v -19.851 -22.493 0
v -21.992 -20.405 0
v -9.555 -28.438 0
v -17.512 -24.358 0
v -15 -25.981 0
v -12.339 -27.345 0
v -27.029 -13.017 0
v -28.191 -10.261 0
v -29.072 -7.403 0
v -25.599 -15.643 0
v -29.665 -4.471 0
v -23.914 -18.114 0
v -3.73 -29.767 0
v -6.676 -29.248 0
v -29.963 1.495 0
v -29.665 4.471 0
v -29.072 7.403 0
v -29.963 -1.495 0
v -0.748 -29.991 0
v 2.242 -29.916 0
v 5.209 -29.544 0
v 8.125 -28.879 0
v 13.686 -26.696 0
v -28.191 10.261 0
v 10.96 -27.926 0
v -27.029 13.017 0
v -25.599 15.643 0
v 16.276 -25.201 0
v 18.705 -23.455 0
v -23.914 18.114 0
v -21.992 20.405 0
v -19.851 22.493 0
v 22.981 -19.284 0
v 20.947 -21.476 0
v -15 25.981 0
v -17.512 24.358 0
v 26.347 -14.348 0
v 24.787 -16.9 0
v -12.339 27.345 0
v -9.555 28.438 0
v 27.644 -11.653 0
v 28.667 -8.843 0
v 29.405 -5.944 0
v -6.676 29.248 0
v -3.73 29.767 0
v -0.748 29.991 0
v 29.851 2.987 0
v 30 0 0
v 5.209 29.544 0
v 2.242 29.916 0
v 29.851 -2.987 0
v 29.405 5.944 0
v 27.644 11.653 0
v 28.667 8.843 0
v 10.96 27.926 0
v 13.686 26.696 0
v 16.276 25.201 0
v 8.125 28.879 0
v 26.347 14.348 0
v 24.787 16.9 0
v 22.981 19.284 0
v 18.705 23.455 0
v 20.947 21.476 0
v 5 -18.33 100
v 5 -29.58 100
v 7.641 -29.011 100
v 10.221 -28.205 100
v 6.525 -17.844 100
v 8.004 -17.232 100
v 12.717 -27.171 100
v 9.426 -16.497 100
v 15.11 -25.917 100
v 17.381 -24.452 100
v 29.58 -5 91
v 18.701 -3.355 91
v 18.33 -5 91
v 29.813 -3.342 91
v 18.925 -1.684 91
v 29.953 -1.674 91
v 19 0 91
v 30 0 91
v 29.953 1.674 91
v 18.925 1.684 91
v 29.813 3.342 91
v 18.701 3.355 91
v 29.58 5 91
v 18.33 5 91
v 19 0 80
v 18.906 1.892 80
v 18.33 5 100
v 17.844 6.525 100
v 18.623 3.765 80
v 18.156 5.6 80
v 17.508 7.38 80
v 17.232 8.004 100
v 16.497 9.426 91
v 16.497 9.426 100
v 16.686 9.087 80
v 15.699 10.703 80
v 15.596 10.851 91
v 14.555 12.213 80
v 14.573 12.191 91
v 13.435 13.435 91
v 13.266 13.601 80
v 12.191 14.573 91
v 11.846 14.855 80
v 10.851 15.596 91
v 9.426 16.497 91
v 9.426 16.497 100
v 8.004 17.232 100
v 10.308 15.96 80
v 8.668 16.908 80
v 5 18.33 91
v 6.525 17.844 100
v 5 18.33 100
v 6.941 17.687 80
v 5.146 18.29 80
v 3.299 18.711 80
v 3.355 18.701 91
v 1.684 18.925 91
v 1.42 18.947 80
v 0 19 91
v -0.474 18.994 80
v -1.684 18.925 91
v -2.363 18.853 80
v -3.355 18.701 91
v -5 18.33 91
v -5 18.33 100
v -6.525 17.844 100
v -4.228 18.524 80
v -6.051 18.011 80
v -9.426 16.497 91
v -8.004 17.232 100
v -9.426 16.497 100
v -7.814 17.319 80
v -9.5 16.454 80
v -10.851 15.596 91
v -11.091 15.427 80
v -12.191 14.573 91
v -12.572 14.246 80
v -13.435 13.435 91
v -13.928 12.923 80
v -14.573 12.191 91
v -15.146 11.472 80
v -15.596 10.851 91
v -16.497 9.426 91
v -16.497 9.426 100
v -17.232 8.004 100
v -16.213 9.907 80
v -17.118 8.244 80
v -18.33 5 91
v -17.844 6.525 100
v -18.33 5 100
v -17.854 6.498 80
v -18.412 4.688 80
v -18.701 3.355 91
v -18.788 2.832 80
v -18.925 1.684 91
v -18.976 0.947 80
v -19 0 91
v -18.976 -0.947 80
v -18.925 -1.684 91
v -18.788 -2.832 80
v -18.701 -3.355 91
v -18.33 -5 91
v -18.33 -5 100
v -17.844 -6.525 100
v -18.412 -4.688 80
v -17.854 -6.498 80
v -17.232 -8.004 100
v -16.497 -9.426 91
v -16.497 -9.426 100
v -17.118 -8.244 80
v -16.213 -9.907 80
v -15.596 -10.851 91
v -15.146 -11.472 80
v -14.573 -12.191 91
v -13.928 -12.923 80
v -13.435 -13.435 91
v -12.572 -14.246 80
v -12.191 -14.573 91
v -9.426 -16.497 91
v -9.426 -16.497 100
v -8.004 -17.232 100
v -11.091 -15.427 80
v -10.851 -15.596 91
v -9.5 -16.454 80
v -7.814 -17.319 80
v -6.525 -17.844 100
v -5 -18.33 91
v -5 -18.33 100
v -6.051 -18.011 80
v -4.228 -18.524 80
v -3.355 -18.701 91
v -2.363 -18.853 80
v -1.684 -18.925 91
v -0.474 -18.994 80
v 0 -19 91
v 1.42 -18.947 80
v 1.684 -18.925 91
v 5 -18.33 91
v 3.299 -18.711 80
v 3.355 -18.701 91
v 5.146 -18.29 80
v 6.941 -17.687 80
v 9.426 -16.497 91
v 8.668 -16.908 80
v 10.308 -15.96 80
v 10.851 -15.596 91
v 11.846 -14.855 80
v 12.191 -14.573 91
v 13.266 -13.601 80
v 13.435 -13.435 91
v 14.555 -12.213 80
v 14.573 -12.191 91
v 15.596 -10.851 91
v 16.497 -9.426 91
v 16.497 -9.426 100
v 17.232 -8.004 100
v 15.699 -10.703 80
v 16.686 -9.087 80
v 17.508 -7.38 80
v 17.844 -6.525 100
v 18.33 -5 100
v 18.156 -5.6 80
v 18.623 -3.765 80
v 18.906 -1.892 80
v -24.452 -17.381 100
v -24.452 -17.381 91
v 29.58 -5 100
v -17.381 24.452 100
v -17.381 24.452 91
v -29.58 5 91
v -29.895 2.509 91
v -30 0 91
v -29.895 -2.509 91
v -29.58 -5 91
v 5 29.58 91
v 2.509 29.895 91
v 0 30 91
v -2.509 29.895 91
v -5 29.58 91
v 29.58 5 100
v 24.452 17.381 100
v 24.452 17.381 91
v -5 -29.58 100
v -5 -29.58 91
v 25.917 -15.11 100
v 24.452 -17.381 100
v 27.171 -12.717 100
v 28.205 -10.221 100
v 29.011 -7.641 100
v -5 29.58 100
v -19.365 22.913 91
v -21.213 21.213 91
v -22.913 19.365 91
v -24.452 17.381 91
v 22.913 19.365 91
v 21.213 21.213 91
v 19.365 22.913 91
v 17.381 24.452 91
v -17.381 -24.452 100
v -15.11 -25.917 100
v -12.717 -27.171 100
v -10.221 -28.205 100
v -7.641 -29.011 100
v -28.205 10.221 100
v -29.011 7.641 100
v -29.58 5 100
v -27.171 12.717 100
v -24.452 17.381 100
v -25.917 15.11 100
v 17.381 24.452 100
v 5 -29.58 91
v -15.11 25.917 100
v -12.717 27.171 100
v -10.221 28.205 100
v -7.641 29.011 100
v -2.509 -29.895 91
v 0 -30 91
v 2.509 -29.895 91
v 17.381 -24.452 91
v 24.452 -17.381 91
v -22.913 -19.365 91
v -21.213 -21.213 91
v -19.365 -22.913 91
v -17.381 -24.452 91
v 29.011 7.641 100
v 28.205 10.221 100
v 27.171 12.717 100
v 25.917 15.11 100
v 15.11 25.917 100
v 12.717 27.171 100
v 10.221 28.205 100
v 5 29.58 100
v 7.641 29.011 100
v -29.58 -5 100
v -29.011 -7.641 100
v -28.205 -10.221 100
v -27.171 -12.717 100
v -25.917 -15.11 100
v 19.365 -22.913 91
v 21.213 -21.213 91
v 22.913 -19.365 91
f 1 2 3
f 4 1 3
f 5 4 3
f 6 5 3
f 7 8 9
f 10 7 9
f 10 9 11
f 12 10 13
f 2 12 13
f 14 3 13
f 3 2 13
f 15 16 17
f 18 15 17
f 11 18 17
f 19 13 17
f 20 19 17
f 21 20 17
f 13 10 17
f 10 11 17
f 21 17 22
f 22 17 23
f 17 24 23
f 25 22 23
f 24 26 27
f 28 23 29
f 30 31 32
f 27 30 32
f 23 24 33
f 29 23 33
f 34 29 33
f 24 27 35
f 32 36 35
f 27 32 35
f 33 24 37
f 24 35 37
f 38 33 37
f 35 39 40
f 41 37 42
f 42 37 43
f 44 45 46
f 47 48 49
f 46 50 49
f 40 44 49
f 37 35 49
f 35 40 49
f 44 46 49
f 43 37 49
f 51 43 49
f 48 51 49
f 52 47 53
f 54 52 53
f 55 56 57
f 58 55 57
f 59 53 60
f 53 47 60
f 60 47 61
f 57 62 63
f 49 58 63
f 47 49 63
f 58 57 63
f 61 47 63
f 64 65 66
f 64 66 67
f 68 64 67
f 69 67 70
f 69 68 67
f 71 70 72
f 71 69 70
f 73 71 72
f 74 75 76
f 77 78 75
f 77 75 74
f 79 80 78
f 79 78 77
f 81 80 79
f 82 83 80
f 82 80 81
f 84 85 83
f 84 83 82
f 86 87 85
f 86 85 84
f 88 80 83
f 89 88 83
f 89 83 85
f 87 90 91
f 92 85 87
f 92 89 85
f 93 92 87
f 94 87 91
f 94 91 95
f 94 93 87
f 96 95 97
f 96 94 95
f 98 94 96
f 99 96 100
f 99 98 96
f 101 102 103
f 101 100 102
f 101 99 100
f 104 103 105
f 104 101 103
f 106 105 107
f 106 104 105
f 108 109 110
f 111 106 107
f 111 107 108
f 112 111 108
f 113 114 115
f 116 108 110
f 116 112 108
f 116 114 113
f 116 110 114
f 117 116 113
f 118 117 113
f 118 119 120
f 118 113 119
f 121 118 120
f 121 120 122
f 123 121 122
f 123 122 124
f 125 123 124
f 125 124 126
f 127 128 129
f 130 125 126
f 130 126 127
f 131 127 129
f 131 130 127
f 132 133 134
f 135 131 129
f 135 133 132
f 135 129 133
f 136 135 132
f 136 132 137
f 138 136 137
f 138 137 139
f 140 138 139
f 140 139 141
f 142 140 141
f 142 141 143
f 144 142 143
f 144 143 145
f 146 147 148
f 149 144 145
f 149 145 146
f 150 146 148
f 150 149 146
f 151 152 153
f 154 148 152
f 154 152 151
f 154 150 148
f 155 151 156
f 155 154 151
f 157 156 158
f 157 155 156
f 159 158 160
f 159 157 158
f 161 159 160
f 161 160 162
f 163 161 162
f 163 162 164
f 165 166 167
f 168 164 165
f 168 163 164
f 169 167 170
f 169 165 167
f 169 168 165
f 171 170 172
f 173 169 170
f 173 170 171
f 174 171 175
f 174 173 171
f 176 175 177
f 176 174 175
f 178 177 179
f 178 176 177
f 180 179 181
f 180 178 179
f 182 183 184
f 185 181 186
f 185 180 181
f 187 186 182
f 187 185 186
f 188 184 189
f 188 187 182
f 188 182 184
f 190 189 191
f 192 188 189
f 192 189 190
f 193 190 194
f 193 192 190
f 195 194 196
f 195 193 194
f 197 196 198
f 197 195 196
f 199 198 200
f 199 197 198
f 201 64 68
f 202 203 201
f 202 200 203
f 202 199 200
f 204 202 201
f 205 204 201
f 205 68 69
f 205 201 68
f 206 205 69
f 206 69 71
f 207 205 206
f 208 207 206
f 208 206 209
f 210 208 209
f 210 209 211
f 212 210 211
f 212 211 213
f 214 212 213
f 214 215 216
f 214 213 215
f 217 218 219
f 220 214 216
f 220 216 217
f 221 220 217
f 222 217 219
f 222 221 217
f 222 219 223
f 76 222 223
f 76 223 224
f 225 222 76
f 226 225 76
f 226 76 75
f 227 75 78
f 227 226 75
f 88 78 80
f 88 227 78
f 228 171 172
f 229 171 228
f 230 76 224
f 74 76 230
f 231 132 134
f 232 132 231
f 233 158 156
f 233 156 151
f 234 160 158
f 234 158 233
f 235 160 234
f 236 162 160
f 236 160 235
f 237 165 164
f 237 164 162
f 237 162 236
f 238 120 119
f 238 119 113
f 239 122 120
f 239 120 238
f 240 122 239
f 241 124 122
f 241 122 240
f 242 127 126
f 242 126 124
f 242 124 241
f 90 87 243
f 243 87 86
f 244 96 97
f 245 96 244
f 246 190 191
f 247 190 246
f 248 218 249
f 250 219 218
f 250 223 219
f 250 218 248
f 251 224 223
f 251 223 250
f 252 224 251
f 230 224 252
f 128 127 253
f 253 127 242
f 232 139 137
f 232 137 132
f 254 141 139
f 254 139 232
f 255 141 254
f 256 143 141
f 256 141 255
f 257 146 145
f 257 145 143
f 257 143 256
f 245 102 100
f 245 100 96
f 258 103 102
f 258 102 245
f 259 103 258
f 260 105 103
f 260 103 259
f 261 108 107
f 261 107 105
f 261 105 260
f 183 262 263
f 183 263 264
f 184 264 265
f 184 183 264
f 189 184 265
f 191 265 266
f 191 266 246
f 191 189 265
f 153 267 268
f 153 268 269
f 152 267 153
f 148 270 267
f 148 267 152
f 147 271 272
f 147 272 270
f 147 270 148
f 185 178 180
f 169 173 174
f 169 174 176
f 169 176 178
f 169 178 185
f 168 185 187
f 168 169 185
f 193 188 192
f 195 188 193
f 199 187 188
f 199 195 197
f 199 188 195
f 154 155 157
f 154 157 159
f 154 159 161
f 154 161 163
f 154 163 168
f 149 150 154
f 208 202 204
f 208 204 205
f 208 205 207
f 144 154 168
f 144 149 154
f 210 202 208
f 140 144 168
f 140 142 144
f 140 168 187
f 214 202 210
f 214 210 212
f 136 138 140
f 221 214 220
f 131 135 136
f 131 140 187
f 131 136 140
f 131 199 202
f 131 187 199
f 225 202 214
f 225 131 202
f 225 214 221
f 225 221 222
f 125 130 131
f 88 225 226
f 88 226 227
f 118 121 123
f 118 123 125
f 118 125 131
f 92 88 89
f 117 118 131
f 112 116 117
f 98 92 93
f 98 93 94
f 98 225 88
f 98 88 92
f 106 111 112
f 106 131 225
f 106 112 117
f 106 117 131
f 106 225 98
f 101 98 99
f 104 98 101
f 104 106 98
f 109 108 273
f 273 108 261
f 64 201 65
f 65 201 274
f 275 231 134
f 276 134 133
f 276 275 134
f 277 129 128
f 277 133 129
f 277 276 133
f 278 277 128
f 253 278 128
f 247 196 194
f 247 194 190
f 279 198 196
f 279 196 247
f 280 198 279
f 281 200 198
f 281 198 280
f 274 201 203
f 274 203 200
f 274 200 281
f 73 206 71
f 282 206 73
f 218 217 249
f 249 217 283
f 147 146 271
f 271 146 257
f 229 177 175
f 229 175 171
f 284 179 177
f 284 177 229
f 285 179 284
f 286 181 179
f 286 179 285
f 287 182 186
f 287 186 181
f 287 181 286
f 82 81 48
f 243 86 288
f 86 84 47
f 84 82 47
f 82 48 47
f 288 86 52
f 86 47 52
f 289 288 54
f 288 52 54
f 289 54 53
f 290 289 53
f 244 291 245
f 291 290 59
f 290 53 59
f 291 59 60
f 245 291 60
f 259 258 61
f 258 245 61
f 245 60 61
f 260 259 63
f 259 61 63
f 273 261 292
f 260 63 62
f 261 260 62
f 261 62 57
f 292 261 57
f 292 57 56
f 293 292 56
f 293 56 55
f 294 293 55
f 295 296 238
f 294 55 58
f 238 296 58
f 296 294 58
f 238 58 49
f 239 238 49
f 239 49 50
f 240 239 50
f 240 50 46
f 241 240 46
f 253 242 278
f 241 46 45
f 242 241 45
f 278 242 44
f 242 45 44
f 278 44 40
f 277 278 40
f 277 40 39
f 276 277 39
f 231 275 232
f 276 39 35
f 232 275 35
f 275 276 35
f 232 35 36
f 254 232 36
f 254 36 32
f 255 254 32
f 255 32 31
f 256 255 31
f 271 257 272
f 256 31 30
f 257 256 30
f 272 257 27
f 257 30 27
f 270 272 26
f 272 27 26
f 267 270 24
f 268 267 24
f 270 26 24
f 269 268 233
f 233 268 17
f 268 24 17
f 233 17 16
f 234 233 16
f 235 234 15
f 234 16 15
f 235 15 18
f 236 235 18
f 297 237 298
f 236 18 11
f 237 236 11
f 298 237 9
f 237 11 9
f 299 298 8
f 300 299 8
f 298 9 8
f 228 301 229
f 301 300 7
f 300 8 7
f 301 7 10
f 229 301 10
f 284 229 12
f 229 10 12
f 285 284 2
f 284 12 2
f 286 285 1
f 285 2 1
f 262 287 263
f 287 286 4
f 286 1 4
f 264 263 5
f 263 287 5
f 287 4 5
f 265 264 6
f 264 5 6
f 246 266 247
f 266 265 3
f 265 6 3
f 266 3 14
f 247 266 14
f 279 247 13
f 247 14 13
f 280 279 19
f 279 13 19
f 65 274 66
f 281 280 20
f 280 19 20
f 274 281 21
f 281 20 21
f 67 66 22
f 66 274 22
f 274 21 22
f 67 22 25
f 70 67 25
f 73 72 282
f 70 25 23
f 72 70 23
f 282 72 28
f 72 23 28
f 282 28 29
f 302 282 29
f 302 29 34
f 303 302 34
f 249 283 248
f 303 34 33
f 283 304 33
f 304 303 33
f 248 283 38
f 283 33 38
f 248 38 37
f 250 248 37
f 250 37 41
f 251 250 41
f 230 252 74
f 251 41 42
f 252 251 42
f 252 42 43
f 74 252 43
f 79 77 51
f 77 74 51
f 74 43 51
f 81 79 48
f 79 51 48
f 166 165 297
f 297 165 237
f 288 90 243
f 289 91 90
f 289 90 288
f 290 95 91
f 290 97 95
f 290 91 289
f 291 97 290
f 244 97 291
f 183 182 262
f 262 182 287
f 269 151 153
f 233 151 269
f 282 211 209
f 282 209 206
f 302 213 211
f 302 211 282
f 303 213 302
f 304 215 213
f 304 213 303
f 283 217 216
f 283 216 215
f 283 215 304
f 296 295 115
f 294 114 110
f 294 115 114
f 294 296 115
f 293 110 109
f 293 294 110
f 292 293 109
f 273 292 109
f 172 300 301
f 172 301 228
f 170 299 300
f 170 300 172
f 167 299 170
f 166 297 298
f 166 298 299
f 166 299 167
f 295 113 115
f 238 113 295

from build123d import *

# Parameters (mm, degrees)
CYLINDER001_R     = 19
CYLINDER001_DEPTH = 20
BOX_W             = 20
BOX_H             = 10
BOX_DEPTH         = 10
ARRAY_COUNT       = 8
CYLINDER_R        = 30
CYLINDER_DEPTH    = 100


with BuildPart() as cilindre001:
    # Cylinder001 → Cylinder001 (new body)
    with BuildSketch(Plane.XY.offset(80)):
        Circle(CYLINDER001_R)
    extrude(amount=CYLINDER001_DEPTH)


with BuildPart() as array:
    # Box → Box (new body)
    with BuildSketch(Plane(origin=(18, -5, 91), x_dir=(1, 0, 0), z_dir=(0, 0, 1))):
        with Locations((10, 5)):
            Rectangle(BOX_W, BOX_H)
    extrude(amount=BOX_DEPTH)

    # Array: Array ×8 about axis
    array_axis = Axis((0, 0, 0), (0, 0, 1))


with BuildPart() as array_1:
    add(array.part)
    for i in range(1, ARRAY_COUNT):
        add(array.part.rotate(array_axis, i * 360 / ARRAY_COUNT))


with BuildPart() as cut001:
    # Cylinder → Cylinder (new body)
    with BuildSketch(Plane.XY):
        Circle(CYLINDER_R)
    extrude(amount=CYLINDER_DEPTH)

    # Cut: cut Array
    add(array_1.part, mode=Mode.SUBTRACT)

    # Cut001: cut Cilindre001
    add(cilindre001.part, mode=Mode.SUBTRACT)


solid = cut001.part
